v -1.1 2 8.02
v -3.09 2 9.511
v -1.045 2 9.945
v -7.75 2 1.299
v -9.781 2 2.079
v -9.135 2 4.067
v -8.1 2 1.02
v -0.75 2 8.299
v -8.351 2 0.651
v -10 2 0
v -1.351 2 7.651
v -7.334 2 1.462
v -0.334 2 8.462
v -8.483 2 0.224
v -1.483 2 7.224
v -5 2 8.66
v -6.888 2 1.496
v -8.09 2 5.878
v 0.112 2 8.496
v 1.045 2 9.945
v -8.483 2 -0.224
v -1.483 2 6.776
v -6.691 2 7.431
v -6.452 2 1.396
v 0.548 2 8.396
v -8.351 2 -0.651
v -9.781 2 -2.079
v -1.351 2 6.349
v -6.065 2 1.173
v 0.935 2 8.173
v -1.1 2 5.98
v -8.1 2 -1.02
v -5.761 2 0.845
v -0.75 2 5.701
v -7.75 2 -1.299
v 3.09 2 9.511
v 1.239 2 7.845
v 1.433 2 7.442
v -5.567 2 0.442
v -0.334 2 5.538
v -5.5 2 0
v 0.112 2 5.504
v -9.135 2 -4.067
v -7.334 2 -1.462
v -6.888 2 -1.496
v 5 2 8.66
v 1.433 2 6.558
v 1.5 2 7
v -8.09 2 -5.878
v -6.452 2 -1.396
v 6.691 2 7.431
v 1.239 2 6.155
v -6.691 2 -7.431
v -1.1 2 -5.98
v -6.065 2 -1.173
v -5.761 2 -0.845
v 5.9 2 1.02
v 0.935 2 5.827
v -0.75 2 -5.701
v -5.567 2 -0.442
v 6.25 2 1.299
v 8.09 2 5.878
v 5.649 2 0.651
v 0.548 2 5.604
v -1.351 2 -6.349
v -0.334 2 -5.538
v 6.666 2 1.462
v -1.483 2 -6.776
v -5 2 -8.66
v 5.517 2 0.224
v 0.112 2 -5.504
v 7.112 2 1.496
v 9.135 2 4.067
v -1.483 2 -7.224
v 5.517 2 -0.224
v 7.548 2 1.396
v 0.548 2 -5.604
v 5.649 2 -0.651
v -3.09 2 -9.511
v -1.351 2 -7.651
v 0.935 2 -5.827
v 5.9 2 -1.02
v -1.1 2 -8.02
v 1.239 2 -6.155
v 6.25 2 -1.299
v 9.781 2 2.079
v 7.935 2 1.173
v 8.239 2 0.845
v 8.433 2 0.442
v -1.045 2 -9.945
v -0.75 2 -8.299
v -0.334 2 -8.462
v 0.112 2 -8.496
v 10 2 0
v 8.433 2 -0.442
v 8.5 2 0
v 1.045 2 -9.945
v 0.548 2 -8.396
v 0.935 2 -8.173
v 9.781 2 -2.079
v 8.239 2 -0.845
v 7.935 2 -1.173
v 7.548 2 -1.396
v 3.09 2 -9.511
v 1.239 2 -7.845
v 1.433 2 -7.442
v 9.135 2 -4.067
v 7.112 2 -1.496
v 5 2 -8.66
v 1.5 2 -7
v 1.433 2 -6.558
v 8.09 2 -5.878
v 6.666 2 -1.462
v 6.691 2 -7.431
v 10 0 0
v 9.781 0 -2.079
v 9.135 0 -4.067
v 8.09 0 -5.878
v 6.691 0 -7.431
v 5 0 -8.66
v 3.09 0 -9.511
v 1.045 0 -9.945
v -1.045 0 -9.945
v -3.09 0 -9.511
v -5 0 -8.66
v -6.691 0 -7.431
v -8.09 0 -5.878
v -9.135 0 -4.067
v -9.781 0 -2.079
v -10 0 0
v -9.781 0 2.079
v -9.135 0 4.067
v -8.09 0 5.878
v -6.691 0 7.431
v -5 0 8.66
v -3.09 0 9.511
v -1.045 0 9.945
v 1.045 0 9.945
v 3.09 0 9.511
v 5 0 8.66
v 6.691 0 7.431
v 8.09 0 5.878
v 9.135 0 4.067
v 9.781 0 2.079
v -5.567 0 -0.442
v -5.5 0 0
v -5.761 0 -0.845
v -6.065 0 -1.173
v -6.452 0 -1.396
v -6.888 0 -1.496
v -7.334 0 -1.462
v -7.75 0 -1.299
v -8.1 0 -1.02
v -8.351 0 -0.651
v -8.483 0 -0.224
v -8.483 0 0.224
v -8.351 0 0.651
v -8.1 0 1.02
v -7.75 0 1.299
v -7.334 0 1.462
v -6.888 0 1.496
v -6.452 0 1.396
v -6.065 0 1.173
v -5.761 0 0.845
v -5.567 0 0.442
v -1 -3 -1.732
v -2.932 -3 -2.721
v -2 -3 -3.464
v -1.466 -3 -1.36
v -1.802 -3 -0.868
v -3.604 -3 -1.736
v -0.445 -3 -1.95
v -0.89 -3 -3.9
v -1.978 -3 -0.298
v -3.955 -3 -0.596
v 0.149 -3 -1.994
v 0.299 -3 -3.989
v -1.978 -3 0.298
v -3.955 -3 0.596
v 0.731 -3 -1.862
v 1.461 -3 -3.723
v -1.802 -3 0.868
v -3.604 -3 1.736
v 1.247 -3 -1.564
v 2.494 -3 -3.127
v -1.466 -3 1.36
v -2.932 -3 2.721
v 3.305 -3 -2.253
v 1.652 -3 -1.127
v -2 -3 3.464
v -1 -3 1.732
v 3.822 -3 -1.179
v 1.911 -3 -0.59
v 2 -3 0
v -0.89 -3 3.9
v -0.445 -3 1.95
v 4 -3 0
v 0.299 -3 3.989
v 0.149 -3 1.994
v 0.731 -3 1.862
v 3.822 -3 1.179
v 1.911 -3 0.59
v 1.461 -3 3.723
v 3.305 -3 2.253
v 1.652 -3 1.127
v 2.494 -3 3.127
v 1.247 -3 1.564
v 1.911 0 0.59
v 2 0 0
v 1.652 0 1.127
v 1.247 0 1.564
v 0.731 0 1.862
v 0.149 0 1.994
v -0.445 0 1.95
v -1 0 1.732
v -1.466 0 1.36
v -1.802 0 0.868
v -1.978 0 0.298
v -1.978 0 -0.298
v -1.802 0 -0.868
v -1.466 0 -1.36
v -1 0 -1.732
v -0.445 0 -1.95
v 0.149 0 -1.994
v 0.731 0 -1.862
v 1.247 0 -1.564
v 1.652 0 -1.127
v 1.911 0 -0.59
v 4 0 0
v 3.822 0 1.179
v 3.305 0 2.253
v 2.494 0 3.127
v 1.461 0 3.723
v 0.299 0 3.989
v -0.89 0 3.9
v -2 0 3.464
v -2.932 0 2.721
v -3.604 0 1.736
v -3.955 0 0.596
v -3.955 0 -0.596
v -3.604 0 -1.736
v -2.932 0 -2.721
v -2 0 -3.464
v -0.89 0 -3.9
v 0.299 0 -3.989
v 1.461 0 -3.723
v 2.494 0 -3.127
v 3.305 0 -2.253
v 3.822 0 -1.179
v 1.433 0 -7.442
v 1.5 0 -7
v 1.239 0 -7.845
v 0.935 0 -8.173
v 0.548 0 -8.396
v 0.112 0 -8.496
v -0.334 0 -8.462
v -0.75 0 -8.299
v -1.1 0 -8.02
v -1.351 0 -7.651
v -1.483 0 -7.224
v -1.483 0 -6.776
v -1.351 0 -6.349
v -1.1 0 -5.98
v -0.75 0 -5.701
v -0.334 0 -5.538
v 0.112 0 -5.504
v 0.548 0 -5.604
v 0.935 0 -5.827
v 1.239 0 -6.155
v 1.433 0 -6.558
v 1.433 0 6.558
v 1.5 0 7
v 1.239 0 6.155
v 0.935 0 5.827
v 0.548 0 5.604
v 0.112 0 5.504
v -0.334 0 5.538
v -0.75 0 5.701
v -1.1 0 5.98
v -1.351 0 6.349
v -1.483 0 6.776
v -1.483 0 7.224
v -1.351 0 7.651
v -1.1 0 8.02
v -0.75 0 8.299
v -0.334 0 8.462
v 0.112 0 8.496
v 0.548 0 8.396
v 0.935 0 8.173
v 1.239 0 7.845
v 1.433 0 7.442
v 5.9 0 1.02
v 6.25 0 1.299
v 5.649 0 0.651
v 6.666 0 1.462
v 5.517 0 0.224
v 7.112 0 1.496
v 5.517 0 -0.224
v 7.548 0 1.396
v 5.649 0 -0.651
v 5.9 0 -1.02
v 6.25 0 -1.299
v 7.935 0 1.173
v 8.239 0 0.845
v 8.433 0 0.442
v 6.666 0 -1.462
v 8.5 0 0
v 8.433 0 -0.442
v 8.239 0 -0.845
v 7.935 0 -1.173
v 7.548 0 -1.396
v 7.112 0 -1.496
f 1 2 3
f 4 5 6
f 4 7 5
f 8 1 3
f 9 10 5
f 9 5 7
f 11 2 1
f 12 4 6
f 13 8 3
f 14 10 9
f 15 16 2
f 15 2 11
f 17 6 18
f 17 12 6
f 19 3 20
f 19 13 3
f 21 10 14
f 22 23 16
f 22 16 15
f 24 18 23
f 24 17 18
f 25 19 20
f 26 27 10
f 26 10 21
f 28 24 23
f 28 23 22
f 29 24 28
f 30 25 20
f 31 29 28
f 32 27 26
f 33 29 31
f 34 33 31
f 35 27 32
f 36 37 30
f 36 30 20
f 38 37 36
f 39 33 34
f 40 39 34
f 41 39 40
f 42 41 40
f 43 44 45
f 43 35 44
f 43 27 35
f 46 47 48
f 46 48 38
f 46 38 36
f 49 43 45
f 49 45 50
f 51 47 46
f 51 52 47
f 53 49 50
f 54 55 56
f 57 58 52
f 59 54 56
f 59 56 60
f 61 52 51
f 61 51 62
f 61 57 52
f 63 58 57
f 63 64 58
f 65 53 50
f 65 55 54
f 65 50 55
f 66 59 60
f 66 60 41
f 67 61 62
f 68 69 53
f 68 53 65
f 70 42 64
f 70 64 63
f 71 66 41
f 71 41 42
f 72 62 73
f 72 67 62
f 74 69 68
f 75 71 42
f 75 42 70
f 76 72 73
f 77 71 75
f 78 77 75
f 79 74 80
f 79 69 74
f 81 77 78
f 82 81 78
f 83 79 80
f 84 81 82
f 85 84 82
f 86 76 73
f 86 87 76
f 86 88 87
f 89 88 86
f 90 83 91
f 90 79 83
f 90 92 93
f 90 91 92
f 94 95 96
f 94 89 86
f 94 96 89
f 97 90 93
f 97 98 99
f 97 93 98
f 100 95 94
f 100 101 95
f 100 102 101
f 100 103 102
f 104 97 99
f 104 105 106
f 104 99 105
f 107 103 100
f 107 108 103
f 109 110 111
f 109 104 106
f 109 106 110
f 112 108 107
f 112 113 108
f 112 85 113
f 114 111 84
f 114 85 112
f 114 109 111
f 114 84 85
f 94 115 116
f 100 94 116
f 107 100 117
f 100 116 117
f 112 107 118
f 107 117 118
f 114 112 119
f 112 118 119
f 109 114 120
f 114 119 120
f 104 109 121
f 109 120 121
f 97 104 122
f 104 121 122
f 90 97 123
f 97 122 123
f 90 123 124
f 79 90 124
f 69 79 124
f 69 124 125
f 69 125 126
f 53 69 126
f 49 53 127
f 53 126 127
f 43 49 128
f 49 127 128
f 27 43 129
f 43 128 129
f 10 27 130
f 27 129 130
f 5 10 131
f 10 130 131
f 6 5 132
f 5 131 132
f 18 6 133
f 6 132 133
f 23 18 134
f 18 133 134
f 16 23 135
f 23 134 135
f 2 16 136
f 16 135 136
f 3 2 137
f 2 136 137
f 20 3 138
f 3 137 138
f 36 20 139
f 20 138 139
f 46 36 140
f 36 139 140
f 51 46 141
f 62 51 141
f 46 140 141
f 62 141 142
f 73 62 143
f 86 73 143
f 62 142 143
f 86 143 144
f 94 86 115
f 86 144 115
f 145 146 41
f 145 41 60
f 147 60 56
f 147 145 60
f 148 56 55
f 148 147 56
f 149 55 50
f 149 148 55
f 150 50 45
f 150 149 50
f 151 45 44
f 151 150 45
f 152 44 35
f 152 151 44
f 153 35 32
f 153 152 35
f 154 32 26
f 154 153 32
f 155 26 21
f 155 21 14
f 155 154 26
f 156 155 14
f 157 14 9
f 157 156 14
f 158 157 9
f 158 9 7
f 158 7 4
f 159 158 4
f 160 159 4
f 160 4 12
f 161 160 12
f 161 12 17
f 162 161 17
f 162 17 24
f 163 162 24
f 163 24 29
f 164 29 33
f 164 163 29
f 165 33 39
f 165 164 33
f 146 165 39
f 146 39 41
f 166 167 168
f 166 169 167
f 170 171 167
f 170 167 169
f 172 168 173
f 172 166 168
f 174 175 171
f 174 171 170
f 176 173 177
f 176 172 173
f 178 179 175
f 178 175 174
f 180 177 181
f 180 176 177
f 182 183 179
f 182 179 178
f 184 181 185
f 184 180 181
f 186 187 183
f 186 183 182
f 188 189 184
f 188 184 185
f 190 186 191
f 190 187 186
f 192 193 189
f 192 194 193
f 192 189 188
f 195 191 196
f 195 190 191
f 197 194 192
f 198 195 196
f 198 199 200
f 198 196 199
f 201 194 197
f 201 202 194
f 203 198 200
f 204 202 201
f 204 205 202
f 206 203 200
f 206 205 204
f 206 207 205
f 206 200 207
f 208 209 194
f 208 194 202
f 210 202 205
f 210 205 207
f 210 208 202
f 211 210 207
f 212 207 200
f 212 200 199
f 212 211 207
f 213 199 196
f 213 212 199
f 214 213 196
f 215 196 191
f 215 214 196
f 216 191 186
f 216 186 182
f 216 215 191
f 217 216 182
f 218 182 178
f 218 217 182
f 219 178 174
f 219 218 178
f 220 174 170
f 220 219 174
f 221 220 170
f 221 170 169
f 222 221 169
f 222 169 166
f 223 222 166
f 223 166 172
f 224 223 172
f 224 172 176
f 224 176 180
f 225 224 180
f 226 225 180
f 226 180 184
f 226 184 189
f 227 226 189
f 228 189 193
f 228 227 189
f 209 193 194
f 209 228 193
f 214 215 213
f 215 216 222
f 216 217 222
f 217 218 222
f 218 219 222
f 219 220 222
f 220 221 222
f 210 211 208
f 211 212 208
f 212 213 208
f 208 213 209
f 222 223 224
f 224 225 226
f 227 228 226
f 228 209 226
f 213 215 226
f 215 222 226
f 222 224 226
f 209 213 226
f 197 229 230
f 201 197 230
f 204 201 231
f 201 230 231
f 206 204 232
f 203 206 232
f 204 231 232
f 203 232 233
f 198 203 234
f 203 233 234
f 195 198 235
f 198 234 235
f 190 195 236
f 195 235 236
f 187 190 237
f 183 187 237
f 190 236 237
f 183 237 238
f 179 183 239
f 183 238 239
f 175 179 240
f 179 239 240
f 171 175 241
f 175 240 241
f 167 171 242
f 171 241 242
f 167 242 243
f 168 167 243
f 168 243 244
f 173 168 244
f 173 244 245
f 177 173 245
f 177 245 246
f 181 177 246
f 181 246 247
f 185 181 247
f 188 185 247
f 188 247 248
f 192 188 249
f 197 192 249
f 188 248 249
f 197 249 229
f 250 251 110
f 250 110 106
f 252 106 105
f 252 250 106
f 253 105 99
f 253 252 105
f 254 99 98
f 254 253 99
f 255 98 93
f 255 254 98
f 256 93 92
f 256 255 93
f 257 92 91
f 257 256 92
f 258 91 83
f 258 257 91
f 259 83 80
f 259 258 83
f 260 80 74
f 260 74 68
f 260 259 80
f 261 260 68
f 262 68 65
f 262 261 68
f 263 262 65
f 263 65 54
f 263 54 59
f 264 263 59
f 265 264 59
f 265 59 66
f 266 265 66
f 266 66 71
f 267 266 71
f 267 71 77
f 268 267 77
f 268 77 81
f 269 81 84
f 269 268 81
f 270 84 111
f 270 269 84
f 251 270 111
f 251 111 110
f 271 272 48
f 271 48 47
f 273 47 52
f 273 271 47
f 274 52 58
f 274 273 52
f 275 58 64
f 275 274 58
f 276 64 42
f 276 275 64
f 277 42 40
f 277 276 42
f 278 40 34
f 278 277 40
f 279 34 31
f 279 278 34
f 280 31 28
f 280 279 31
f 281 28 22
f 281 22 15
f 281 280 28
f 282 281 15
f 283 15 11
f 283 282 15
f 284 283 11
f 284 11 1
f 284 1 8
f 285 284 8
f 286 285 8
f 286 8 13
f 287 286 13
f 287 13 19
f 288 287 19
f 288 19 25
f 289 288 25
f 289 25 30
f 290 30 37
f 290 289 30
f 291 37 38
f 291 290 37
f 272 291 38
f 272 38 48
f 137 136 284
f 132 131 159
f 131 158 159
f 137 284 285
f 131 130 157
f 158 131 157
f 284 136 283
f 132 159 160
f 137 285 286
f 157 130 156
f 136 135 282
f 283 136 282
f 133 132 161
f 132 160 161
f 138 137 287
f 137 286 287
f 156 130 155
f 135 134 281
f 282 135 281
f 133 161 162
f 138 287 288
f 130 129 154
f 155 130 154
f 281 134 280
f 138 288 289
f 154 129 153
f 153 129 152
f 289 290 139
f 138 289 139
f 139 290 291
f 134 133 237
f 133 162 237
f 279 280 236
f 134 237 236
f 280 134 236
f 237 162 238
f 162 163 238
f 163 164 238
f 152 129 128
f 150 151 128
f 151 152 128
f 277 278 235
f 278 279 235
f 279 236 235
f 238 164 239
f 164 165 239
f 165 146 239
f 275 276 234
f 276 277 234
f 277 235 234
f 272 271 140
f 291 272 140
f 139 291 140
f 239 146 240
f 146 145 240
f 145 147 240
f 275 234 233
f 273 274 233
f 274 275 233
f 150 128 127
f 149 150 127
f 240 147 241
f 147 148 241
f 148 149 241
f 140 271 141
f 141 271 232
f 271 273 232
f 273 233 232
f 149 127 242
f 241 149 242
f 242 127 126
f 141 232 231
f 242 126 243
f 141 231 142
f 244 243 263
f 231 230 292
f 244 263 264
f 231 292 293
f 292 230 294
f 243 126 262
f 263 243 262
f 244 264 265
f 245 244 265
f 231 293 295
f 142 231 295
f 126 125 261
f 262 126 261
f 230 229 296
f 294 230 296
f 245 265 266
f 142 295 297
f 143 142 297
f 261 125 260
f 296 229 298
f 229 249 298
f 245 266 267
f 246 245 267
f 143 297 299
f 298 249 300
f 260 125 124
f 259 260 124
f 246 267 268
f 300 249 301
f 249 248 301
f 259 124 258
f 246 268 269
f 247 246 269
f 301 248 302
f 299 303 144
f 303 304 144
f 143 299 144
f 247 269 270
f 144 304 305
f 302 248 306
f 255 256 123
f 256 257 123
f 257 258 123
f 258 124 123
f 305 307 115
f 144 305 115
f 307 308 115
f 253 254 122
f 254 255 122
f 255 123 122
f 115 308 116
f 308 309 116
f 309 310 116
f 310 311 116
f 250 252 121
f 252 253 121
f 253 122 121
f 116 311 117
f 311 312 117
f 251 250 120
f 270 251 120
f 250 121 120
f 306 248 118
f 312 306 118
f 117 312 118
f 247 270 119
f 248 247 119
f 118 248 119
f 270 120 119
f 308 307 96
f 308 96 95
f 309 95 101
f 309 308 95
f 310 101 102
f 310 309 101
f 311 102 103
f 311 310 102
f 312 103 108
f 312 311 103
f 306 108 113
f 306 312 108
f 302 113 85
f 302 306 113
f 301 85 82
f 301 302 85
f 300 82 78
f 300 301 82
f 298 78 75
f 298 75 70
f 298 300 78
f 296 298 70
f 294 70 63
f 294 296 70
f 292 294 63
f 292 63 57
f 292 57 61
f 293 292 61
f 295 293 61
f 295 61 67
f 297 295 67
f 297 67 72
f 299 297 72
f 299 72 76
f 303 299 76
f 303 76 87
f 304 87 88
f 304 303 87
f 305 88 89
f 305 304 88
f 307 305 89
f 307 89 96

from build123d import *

# Parameters (mm, degrees)
SKETCH1_R           = 10
SKETCH1_R_2         = 1.5
BOSS_EXTRUDE1_DEPTH = 2
SKETCH2_R           = 4
SKETCH2_R_2         = 2
BOSS_EXTRUDE2_DEPTH = 3


with BuildPart() as part:
    # Sketch1 → Boss-Extrude1 (new body)
    with BuildSketch(Plane(origin=(0, 0, 0), x_dir=(1, 0, 0), z_dir=(0, 1, 0))):
        Circle(SKETCH1_R)
        with Locations((0, 7)):
            Circle(SKETCH1_R_2, mode=Mode.SUBTRACT)
        with Locations((7, 0)):
            Circle(SKETCH1_R_2, mode=Mode.SUBTRACT)
        with Locations((0, -7)):
            Circle(SKETCH1_R_2, mode=Mode.SUBTRACT)
        with Locations((-7, 0)):
            Circle(SKETCH1_R_2, mode=Mode.SUBTRACT)
    extrude(amount=BOSS_EXTRUDE1_DEPTH)

    # Sketch2 → Boss-Extrude2 (add)
    with BuildSketch(Plane.XZ):
        Circle(SKETCH2_R)
        Circle(SKETCH2_R_2, mode=Mode.SUBTRACT)
    extrude(amount=BOSS_EXTRUDE2_DEPTH)


solid = part.part
